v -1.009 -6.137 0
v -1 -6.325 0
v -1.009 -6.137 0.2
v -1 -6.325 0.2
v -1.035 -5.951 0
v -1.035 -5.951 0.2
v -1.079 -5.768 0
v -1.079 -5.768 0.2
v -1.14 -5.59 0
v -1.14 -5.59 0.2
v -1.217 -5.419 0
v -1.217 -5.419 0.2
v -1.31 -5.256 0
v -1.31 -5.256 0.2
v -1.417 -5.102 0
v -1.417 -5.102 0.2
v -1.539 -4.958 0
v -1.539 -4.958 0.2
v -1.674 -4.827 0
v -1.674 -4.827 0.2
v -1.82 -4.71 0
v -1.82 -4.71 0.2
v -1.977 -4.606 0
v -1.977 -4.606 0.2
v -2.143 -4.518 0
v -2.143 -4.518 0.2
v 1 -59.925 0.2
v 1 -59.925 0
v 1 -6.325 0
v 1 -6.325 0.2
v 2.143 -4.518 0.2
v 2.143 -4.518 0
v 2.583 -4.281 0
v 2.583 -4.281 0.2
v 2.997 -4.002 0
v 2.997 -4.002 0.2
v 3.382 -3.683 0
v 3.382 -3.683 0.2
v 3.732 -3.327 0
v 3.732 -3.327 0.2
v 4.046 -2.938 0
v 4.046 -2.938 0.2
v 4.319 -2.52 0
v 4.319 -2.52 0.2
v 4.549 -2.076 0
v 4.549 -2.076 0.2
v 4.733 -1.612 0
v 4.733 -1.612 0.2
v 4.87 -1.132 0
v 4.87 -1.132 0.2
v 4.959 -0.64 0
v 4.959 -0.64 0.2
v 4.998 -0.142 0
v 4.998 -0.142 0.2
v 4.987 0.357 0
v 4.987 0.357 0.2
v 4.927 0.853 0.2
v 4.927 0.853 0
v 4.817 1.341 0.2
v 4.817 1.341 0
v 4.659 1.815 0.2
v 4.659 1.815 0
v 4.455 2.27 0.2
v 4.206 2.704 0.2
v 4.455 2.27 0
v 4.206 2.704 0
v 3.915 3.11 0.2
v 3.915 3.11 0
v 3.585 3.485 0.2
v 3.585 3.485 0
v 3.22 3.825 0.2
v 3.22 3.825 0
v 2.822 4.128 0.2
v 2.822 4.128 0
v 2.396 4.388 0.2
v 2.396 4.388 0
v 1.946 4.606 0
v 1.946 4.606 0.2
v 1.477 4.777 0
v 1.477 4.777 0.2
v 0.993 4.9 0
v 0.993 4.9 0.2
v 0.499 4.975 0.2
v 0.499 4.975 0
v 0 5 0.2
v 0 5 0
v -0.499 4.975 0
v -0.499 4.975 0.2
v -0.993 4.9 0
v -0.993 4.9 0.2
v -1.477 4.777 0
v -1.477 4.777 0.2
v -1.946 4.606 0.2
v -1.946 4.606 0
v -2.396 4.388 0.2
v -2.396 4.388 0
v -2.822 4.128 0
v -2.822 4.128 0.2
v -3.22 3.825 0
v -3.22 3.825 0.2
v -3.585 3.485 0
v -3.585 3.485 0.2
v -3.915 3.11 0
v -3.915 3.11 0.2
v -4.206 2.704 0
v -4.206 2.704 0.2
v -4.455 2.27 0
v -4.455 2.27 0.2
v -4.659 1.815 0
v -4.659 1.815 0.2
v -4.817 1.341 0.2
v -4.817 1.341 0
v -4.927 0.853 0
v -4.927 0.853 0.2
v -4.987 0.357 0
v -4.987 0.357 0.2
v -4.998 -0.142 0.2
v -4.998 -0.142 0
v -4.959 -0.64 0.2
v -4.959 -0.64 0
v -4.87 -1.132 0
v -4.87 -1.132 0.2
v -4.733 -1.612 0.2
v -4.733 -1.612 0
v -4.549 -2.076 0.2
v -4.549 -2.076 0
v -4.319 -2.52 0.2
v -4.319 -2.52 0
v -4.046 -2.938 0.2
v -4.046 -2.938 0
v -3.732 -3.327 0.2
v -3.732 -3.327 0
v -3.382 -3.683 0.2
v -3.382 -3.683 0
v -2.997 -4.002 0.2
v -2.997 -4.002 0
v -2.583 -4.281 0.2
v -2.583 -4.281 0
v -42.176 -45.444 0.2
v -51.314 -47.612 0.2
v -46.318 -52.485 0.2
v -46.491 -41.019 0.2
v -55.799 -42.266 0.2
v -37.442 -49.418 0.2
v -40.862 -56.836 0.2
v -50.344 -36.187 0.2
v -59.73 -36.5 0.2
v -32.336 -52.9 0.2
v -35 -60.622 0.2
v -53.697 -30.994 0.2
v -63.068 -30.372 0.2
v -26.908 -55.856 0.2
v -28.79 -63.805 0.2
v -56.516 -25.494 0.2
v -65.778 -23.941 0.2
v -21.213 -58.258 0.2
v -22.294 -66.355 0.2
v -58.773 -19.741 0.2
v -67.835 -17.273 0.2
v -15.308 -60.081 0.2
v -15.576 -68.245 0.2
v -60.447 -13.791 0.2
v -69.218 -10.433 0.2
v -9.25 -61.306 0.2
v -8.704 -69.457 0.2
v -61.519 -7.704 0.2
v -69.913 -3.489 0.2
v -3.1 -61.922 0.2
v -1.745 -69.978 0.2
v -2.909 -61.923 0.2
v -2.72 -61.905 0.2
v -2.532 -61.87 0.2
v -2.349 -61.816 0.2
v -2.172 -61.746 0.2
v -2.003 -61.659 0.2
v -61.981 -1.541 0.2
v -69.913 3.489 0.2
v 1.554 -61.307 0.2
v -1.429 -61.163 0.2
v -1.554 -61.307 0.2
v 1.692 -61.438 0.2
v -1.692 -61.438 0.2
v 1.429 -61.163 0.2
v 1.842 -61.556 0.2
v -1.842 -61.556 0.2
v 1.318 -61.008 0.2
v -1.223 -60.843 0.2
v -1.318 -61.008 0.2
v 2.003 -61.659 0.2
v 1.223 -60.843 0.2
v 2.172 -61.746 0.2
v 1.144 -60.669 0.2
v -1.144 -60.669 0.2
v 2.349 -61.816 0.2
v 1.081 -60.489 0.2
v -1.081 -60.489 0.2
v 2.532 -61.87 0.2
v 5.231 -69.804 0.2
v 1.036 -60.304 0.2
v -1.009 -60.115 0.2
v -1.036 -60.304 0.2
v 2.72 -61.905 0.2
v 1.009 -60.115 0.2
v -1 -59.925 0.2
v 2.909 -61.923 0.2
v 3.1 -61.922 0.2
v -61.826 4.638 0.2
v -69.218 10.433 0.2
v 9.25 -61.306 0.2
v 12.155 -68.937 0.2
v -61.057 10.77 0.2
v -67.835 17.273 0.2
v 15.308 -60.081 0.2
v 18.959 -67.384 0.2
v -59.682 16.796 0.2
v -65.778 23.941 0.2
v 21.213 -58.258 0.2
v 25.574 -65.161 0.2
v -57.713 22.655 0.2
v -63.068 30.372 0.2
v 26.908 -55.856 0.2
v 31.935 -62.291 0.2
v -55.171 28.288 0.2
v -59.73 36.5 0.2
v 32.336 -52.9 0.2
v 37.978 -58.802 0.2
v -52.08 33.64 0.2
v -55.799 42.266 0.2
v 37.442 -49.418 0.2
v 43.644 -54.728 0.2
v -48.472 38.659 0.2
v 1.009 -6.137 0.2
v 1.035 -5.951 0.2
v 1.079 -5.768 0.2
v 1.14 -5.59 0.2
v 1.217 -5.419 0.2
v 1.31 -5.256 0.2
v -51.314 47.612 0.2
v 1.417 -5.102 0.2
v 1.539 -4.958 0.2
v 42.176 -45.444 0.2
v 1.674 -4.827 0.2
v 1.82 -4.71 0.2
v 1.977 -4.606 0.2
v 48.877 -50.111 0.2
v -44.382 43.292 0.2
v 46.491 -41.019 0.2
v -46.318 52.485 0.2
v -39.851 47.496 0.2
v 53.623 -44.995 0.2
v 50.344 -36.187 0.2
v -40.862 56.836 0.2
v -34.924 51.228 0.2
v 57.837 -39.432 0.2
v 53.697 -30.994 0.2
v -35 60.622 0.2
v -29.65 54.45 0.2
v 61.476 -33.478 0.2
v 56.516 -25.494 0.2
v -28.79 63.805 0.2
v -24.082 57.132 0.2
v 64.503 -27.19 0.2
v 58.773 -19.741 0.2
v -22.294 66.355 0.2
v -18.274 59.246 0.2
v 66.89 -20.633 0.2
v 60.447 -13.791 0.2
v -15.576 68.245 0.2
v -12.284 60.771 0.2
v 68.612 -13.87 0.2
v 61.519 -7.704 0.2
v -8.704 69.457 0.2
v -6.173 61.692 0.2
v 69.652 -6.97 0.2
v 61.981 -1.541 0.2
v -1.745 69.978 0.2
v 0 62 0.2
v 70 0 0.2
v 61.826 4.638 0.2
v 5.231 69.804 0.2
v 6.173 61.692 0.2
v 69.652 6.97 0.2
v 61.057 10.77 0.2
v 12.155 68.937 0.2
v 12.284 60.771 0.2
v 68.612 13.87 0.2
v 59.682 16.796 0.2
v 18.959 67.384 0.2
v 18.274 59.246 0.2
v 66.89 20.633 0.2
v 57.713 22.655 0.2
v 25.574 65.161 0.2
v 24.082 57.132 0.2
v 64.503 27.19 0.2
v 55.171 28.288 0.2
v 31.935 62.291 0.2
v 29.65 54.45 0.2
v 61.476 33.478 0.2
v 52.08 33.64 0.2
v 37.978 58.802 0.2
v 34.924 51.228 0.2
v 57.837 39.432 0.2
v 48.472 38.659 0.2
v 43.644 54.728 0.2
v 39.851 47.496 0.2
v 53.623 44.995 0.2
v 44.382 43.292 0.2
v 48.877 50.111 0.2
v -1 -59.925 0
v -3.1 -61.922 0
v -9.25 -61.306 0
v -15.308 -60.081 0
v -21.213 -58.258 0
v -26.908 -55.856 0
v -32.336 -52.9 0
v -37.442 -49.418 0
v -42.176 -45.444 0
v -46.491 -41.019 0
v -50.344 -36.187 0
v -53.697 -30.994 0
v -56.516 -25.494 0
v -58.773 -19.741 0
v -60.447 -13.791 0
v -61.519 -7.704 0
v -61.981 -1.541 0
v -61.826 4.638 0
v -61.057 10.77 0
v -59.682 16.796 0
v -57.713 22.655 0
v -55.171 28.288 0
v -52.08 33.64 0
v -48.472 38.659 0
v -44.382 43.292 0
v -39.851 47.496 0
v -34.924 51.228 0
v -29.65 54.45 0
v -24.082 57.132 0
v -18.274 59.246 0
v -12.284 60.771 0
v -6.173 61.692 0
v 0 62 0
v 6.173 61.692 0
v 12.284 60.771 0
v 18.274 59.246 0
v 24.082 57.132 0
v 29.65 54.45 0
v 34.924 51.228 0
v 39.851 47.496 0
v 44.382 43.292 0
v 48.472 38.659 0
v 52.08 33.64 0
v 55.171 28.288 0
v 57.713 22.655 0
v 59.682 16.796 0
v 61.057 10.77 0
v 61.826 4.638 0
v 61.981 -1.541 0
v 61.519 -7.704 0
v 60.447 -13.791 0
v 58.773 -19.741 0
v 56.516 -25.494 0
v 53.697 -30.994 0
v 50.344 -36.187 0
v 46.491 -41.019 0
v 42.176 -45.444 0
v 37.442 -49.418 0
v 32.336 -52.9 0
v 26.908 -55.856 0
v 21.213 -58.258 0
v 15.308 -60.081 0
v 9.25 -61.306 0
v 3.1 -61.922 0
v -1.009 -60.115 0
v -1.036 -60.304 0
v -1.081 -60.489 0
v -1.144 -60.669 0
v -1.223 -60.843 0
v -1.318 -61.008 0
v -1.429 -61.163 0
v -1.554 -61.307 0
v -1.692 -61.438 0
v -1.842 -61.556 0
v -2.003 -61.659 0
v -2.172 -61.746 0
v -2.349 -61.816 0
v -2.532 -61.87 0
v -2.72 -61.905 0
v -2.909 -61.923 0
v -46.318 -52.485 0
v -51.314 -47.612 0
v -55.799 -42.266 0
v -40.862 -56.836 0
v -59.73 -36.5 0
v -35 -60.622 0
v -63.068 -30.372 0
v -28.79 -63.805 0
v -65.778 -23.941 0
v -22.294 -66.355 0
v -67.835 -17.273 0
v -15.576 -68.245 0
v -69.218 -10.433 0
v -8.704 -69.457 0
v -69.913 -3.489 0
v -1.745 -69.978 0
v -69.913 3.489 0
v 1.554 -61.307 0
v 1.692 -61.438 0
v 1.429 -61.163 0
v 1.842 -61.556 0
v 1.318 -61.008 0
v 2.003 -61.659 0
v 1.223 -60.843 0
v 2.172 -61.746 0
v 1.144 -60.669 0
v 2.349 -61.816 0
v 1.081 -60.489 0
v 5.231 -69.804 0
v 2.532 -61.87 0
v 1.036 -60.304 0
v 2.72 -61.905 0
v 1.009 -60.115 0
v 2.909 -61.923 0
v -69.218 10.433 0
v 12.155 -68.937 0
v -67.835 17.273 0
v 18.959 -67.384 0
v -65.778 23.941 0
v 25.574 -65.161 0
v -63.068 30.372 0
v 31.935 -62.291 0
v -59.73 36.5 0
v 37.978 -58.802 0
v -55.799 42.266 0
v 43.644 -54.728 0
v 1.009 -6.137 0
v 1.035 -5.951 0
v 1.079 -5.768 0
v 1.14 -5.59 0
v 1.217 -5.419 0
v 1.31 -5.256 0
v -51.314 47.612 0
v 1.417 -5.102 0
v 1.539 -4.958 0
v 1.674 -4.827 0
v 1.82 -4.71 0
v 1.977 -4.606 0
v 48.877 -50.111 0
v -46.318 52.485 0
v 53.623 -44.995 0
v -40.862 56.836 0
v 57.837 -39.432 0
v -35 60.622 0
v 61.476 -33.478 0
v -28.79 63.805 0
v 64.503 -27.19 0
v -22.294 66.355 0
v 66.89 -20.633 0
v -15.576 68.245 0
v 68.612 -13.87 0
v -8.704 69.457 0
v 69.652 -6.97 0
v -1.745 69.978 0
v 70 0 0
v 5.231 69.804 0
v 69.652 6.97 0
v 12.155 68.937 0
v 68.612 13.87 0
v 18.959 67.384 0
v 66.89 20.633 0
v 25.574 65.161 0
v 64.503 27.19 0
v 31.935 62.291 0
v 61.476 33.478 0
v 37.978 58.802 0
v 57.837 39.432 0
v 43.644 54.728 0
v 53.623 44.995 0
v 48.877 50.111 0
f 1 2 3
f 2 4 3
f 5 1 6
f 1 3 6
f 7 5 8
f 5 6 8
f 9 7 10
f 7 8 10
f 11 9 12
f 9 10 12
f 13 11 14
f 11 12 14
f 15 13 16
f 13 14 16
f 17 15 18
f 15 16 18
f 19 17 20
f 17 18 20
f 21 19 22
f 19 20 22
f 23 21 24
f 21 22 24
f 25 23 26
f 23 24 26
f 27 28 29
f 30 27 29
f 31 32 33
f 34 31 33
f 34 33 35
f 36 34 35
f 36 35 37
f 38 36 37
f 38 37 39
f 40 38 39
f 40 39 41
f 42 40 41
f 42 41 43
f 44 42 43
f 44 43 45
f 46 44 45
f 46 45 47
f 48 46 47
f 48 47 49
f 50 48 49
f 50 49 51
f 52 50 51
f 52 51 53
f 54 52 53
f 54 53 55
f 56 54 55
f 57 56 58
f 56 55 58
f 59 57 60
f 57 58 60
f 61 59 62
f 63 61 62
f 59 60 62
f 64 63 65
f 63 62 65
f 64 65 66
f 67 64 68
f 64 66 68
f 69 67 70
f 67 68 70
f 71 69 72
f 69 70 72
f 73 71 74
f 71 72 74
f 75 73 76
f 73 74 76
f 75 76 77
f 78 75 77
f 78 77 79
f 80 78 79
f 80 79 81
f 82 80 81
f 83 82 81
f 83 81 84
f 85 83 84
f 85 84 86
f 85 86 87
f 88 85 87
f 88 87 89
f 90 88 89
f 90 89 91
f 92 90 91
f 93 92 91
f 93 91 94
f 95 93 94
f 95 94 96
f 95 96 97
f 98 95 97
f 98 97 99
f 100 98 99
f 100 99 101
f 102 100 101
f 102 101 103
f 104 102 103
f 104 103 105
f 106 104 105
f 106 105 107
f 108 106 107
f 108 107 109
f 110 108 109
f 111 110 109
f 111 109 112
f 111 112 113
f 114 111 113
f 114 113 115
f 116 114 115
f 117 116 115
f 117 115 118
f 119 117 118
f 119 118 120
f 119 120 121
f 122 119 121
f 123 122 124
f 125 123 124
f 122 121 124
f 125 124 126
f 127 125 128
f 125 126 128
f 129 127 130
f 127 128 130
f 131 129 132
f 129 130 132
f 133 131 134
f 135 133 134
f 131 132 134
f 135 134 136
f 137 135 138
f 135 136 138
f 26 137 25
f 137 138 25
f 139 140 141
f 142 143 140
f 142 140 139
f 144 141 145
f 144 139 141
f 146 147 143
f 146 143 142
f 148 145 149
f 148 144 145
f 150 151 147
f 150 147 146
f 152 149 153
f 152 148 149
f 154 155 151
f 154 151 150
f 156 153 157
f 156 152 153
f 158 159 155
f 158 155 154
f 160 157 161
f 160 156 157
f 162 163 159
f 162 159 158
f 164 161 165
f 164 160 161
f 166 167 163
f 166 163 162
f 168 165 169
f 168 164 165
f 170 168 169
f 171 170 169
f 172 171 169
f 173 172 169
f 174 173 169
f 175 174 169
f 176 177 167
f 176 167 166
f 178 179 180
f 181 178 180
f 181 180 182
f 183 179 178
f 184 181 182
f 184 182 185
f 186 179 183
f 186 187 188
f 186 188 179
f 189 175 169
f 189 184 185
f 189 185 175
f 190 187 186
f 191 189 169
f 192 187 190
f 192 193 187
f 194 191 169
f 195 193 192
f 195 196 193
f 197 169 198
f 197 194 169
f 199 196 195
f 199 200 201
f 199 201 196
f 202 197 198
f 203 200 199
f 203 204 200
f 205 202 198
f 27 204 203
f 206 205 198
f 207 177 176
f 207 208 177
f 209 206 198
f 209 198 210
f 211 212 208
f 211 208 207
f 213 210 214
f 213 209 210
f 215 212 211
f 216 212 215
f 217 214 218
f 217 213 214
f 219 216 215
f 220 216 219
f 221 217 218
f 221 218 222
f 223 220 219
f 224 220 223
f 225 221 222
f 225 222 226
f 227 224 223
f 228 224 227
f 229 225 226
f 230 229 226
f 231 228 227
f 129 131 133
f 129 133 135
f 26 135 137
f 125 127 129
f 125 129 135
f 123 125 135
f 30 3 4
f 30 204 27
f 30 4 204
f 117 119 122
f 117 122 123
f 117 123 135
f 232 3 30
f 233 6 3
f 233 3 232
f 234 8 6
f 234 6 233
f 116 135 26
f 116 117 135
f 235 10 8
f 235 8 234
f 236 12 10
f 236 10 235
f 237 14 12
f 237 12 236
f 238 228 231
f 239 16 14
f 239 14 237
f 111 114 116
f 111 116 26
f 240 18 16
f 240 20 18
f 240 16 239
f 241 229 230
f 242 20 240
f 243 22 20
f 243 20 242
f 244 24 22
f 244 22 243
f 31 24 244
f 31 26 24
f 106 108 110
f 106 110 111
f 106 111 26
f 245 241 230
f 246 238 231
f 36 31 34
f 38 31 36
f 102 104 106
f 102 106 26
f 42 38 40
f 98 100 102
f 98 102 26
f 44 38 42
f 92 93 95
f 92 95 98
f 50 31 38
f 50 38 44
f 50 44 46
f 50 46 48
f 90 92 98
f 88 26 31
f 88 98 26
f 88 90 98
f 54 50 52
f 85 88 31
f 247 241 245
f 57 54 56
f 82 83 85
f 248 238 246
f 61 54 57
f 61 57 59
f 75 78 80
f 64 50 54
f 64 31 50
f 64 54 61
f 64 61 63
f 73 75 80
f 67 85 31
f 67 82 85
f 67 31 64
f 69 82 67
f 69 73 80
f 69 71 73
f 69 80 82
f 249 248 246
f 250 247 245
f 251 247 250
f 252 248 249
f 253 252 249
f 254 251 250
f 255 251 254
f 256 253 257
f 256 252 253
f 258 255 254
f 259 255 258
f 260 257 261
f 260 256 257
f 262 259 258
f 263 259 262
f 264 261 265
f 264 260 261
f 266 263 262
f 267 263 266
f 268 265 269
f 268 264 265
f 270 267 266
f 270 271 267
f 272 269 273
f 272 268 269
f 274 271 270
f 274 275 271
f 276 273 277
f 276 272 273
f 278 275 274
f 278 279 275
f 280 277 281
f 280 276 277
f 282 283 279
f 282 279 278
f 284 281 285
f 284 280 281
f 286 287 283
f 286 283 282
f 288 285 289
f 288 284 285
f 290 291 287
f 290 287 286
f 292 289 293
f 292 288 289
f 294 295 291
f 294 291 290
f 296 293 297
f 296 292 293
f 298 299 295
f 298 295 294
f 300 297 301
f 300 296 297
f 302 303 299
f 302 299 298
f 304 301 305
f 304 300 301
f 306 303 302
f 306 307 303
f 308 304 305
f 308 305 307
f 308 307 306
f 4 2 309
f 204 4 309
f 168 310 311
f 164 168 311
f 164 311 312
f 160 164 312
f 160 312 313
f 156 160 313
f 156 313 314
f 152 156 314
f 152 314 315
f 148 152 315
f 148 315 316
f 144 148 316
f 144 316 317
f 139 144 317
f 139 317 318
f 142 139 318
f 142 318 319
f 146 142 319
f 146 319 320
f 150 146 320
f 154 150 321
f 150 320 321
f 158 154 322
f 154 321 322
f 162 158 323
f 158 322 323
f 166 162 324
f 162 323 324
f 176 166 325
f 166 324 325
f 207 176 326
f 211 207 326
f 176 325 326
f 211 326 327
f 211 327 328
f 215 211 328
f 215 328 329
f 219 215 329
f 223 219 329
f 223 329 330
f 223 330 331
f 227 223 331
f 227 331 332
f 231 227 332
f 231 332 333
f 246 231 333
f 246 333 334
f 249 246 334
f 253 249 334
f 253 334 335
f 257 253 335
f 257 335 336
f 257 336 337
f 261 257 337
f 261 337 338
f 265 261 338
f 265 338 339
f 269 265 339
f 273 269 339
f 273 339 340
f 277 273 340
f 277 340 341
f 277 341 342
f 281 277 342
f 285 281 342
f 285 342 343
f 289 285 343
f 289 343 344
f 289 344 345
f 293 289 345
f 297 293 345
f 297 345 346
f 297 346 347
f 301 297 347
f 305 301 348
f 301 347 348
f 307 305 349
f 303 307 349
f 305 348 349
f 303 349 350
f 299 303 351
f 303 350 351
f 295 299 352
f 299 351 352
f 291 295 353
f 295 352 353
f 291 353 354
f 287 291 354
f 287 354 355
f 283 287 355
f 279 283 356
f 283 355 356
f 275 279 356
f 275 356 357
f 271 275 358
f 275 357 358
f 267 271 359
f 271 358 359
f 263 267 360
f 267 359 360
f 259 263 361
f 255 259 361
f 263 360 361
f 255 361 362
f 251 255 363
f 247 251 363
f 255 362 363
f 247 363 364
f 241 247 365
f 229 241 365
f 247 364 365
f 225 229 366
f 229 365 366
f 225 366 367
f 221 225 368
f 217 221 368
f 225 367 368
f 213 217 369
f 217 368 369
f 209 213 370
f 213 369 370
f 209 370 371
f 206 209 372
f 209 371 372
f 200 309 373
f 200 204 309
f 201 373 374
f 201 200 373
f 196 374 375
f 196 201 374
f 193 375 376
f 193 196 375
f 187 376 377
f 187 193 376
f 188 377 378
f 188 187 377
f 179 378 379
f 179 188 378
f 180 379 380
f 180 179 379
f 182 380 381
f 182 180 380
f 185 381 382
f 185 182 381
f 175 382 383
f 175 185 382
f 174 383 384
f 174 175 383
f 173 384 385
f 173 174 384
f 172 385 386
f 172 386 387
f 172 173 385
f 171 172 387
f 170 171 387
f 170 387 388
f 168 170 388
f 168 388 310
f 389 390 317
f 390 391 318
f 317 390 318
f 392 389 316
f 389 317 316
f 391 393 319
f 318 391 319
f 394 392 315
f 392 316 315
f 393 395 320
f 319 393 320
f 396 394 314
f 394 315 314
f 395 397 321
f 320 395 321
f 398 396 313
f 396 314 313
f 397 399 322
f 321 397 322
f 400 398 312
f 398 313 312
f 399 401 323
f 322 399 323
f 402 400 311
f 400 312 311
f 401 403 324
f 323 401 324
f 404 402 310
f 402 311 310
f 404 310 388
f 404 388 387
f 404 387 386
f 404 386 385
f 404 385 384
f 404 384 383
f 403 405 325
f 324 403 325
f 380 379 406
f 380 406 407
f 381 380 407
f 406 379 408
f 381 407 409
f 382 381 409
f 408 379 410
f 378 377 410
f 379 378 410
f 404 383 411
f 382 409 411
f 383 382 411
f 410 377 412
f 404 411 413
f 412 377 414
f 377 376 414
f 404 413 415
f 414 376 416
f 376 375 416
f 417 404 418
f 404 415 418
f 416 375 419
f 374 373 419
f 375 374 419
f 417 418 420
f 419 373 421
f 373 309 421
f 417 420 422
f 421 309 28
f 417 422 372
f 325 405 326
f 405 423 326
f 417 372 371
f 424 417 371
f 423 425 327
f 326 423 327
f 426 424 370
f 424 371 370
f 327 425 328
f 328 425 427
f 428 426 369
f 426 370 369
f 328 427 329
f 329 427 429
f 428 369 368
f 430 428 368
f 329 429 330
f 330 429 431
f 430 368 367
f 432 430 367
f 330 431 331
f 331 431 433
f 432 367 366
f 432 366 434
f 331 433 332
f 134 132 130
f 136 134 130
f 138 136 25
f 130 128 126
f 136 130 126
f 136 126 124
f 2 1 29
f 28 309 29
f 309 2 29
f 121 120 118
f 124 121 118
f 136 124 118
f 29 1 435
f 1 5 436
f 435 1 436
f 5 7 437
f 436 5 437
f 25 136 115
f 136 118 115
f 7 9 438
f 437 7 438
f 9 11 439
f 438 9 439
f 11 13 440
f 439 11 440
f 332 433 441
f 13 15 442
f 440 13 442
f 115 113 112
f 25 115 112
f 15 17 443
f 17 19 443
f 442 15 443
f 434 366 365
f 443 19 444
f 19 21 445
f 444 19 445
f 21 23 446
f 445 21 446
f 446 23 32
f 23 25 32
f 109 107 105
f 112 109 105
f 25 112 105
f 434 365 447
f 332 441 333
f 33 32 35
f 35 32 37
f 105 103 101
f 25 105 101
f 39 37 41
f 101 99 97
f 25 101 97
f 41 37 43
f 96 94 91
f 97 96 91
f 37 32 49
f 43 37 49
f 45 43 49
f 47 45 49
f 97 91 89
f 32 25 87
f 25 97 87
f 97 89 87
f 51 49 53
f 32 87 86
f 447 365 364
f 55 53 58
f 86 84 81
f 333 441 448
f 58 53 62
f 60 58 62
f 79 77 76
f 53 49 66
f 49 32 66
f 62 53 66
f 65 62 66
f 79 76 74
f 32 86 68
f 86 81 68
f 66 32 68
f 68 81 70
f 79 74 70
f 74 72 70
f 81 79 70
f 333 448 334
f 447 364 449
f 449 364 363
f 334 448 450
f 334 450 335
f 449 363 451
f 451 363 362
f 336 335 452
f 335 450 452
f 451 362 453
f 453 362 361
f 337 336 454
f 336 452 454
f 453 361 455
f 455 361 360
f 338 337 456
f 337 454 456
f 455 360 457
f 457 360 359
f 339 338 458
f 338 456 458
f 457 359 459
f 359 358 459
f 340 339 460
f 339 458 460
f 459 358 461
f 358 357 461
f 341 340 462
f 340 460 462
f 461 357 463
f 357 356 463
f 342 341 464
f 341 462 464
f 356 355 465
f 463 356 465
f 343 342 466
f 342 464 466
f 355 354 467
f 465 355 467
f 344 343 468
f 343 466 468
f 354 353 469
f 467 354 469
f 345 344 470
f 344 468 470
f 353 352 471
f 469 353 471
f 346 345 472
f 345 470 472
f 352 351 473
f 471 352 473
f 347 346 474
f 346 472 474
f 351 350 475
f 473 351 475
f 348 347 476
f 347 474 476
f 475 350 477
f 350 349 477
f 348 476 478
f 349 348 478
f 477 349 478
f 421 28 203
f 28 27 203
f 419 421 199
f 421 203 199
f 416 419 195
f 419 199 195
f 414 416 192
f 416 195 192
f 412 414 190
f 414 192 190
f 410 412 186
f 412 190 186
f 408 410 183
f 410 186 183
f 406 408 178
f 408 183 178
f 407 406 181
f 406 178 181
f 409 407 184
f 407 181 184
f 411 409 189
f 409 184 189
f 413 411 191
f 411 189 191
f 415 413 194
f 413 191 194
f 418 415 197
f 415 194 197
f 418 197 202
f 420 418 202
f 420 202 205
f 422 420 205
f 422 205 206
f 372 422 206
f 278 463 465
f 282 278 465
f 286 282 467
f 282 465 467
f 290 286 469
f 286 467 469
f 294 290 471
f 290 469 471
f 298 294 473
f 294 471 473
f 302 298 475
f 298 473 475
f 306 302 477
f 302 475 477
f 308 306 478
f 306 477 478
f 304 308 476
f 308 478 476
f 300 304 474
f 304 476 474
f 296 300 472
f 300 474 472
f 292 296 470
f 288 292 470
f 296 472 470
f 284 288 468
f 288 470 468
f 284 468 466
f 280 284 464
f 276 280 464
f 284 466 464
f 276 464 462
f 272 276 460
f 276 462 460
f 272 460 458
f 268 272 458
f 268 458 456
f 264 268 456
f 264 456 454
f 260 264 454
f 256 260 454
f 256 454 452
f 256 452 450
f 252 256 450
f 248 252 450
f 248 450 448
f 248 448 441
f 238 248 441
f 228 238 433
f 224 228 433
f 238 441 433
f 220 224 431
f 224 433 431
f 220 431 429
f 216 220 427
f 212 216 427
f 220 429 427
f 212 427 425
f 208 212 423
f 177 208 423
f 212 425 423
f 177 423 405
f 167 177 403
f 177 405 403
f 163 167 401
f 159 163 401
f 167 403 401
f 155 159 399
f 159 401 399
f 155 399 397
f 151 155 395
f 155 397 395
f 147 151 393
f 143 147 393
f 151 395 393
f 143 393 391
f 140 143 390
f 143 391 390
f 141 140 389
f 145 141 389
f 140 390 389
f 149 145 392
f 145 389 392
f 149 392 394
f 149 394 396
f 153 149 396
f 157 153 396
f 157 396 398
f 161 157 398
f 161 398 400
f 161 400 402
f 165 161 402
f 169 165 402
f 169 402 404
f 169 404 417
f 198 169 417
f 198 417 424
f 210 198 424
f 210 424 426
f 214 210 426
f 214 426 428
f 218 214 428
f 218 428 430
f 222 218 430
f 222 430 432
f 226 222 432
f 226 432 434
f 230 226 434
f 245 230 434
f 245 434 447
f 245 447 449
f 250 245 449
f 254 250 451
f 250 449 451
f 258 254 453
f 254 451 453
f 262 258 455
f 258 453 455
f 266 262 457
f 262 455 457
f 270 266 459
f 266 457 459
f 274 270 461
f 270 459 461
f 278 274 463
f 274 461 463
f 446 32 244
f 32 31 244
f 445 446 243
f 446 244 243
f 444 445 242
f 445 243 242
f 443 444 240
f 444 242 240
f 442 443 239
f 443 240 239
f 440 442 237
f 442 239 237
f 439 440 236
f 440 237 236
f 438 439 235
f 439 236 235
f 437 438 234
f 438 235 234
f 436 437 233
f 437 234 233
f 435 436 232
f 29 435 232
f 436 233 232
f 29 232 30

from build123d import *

# Parameters (mm, degrees)
F0_R     = 70
F1_DEPTH = 0.2
F2_R     = 2


with BuildPart() as f1:
    # F0 (on Top) → F1 (new body)
    with BuildSketch(Plane.XY):
        Circle(F0_R)
        with BuildLine():
            ThreePointArc((-1, -61.991935), (0, 62), (1, -61.991935))
            Line((1, -61.991935), (1, -4.898979))
            ThreePointArc((1, -4.898979), (0, 5), (-1, -4.898979))
            Line((-1, -4.898979), (-1, -61.991935))
        make_face(mode=Mode.SUBTRACT)
    extrude(amount=F1_DEPTH)

    # F2
    f2_edges = [f1.edges().sort_by_distance(p)[0] for p in [
        (1, -4.898979, 0.1),
        (-1, -4.898979, 0.1),
        (1, -61.991935, 0.1),
        (-1, -61.991935, 0.1),
    ]]
    fillet(f2_edges, radius=F2_R)


solid = f1.part
